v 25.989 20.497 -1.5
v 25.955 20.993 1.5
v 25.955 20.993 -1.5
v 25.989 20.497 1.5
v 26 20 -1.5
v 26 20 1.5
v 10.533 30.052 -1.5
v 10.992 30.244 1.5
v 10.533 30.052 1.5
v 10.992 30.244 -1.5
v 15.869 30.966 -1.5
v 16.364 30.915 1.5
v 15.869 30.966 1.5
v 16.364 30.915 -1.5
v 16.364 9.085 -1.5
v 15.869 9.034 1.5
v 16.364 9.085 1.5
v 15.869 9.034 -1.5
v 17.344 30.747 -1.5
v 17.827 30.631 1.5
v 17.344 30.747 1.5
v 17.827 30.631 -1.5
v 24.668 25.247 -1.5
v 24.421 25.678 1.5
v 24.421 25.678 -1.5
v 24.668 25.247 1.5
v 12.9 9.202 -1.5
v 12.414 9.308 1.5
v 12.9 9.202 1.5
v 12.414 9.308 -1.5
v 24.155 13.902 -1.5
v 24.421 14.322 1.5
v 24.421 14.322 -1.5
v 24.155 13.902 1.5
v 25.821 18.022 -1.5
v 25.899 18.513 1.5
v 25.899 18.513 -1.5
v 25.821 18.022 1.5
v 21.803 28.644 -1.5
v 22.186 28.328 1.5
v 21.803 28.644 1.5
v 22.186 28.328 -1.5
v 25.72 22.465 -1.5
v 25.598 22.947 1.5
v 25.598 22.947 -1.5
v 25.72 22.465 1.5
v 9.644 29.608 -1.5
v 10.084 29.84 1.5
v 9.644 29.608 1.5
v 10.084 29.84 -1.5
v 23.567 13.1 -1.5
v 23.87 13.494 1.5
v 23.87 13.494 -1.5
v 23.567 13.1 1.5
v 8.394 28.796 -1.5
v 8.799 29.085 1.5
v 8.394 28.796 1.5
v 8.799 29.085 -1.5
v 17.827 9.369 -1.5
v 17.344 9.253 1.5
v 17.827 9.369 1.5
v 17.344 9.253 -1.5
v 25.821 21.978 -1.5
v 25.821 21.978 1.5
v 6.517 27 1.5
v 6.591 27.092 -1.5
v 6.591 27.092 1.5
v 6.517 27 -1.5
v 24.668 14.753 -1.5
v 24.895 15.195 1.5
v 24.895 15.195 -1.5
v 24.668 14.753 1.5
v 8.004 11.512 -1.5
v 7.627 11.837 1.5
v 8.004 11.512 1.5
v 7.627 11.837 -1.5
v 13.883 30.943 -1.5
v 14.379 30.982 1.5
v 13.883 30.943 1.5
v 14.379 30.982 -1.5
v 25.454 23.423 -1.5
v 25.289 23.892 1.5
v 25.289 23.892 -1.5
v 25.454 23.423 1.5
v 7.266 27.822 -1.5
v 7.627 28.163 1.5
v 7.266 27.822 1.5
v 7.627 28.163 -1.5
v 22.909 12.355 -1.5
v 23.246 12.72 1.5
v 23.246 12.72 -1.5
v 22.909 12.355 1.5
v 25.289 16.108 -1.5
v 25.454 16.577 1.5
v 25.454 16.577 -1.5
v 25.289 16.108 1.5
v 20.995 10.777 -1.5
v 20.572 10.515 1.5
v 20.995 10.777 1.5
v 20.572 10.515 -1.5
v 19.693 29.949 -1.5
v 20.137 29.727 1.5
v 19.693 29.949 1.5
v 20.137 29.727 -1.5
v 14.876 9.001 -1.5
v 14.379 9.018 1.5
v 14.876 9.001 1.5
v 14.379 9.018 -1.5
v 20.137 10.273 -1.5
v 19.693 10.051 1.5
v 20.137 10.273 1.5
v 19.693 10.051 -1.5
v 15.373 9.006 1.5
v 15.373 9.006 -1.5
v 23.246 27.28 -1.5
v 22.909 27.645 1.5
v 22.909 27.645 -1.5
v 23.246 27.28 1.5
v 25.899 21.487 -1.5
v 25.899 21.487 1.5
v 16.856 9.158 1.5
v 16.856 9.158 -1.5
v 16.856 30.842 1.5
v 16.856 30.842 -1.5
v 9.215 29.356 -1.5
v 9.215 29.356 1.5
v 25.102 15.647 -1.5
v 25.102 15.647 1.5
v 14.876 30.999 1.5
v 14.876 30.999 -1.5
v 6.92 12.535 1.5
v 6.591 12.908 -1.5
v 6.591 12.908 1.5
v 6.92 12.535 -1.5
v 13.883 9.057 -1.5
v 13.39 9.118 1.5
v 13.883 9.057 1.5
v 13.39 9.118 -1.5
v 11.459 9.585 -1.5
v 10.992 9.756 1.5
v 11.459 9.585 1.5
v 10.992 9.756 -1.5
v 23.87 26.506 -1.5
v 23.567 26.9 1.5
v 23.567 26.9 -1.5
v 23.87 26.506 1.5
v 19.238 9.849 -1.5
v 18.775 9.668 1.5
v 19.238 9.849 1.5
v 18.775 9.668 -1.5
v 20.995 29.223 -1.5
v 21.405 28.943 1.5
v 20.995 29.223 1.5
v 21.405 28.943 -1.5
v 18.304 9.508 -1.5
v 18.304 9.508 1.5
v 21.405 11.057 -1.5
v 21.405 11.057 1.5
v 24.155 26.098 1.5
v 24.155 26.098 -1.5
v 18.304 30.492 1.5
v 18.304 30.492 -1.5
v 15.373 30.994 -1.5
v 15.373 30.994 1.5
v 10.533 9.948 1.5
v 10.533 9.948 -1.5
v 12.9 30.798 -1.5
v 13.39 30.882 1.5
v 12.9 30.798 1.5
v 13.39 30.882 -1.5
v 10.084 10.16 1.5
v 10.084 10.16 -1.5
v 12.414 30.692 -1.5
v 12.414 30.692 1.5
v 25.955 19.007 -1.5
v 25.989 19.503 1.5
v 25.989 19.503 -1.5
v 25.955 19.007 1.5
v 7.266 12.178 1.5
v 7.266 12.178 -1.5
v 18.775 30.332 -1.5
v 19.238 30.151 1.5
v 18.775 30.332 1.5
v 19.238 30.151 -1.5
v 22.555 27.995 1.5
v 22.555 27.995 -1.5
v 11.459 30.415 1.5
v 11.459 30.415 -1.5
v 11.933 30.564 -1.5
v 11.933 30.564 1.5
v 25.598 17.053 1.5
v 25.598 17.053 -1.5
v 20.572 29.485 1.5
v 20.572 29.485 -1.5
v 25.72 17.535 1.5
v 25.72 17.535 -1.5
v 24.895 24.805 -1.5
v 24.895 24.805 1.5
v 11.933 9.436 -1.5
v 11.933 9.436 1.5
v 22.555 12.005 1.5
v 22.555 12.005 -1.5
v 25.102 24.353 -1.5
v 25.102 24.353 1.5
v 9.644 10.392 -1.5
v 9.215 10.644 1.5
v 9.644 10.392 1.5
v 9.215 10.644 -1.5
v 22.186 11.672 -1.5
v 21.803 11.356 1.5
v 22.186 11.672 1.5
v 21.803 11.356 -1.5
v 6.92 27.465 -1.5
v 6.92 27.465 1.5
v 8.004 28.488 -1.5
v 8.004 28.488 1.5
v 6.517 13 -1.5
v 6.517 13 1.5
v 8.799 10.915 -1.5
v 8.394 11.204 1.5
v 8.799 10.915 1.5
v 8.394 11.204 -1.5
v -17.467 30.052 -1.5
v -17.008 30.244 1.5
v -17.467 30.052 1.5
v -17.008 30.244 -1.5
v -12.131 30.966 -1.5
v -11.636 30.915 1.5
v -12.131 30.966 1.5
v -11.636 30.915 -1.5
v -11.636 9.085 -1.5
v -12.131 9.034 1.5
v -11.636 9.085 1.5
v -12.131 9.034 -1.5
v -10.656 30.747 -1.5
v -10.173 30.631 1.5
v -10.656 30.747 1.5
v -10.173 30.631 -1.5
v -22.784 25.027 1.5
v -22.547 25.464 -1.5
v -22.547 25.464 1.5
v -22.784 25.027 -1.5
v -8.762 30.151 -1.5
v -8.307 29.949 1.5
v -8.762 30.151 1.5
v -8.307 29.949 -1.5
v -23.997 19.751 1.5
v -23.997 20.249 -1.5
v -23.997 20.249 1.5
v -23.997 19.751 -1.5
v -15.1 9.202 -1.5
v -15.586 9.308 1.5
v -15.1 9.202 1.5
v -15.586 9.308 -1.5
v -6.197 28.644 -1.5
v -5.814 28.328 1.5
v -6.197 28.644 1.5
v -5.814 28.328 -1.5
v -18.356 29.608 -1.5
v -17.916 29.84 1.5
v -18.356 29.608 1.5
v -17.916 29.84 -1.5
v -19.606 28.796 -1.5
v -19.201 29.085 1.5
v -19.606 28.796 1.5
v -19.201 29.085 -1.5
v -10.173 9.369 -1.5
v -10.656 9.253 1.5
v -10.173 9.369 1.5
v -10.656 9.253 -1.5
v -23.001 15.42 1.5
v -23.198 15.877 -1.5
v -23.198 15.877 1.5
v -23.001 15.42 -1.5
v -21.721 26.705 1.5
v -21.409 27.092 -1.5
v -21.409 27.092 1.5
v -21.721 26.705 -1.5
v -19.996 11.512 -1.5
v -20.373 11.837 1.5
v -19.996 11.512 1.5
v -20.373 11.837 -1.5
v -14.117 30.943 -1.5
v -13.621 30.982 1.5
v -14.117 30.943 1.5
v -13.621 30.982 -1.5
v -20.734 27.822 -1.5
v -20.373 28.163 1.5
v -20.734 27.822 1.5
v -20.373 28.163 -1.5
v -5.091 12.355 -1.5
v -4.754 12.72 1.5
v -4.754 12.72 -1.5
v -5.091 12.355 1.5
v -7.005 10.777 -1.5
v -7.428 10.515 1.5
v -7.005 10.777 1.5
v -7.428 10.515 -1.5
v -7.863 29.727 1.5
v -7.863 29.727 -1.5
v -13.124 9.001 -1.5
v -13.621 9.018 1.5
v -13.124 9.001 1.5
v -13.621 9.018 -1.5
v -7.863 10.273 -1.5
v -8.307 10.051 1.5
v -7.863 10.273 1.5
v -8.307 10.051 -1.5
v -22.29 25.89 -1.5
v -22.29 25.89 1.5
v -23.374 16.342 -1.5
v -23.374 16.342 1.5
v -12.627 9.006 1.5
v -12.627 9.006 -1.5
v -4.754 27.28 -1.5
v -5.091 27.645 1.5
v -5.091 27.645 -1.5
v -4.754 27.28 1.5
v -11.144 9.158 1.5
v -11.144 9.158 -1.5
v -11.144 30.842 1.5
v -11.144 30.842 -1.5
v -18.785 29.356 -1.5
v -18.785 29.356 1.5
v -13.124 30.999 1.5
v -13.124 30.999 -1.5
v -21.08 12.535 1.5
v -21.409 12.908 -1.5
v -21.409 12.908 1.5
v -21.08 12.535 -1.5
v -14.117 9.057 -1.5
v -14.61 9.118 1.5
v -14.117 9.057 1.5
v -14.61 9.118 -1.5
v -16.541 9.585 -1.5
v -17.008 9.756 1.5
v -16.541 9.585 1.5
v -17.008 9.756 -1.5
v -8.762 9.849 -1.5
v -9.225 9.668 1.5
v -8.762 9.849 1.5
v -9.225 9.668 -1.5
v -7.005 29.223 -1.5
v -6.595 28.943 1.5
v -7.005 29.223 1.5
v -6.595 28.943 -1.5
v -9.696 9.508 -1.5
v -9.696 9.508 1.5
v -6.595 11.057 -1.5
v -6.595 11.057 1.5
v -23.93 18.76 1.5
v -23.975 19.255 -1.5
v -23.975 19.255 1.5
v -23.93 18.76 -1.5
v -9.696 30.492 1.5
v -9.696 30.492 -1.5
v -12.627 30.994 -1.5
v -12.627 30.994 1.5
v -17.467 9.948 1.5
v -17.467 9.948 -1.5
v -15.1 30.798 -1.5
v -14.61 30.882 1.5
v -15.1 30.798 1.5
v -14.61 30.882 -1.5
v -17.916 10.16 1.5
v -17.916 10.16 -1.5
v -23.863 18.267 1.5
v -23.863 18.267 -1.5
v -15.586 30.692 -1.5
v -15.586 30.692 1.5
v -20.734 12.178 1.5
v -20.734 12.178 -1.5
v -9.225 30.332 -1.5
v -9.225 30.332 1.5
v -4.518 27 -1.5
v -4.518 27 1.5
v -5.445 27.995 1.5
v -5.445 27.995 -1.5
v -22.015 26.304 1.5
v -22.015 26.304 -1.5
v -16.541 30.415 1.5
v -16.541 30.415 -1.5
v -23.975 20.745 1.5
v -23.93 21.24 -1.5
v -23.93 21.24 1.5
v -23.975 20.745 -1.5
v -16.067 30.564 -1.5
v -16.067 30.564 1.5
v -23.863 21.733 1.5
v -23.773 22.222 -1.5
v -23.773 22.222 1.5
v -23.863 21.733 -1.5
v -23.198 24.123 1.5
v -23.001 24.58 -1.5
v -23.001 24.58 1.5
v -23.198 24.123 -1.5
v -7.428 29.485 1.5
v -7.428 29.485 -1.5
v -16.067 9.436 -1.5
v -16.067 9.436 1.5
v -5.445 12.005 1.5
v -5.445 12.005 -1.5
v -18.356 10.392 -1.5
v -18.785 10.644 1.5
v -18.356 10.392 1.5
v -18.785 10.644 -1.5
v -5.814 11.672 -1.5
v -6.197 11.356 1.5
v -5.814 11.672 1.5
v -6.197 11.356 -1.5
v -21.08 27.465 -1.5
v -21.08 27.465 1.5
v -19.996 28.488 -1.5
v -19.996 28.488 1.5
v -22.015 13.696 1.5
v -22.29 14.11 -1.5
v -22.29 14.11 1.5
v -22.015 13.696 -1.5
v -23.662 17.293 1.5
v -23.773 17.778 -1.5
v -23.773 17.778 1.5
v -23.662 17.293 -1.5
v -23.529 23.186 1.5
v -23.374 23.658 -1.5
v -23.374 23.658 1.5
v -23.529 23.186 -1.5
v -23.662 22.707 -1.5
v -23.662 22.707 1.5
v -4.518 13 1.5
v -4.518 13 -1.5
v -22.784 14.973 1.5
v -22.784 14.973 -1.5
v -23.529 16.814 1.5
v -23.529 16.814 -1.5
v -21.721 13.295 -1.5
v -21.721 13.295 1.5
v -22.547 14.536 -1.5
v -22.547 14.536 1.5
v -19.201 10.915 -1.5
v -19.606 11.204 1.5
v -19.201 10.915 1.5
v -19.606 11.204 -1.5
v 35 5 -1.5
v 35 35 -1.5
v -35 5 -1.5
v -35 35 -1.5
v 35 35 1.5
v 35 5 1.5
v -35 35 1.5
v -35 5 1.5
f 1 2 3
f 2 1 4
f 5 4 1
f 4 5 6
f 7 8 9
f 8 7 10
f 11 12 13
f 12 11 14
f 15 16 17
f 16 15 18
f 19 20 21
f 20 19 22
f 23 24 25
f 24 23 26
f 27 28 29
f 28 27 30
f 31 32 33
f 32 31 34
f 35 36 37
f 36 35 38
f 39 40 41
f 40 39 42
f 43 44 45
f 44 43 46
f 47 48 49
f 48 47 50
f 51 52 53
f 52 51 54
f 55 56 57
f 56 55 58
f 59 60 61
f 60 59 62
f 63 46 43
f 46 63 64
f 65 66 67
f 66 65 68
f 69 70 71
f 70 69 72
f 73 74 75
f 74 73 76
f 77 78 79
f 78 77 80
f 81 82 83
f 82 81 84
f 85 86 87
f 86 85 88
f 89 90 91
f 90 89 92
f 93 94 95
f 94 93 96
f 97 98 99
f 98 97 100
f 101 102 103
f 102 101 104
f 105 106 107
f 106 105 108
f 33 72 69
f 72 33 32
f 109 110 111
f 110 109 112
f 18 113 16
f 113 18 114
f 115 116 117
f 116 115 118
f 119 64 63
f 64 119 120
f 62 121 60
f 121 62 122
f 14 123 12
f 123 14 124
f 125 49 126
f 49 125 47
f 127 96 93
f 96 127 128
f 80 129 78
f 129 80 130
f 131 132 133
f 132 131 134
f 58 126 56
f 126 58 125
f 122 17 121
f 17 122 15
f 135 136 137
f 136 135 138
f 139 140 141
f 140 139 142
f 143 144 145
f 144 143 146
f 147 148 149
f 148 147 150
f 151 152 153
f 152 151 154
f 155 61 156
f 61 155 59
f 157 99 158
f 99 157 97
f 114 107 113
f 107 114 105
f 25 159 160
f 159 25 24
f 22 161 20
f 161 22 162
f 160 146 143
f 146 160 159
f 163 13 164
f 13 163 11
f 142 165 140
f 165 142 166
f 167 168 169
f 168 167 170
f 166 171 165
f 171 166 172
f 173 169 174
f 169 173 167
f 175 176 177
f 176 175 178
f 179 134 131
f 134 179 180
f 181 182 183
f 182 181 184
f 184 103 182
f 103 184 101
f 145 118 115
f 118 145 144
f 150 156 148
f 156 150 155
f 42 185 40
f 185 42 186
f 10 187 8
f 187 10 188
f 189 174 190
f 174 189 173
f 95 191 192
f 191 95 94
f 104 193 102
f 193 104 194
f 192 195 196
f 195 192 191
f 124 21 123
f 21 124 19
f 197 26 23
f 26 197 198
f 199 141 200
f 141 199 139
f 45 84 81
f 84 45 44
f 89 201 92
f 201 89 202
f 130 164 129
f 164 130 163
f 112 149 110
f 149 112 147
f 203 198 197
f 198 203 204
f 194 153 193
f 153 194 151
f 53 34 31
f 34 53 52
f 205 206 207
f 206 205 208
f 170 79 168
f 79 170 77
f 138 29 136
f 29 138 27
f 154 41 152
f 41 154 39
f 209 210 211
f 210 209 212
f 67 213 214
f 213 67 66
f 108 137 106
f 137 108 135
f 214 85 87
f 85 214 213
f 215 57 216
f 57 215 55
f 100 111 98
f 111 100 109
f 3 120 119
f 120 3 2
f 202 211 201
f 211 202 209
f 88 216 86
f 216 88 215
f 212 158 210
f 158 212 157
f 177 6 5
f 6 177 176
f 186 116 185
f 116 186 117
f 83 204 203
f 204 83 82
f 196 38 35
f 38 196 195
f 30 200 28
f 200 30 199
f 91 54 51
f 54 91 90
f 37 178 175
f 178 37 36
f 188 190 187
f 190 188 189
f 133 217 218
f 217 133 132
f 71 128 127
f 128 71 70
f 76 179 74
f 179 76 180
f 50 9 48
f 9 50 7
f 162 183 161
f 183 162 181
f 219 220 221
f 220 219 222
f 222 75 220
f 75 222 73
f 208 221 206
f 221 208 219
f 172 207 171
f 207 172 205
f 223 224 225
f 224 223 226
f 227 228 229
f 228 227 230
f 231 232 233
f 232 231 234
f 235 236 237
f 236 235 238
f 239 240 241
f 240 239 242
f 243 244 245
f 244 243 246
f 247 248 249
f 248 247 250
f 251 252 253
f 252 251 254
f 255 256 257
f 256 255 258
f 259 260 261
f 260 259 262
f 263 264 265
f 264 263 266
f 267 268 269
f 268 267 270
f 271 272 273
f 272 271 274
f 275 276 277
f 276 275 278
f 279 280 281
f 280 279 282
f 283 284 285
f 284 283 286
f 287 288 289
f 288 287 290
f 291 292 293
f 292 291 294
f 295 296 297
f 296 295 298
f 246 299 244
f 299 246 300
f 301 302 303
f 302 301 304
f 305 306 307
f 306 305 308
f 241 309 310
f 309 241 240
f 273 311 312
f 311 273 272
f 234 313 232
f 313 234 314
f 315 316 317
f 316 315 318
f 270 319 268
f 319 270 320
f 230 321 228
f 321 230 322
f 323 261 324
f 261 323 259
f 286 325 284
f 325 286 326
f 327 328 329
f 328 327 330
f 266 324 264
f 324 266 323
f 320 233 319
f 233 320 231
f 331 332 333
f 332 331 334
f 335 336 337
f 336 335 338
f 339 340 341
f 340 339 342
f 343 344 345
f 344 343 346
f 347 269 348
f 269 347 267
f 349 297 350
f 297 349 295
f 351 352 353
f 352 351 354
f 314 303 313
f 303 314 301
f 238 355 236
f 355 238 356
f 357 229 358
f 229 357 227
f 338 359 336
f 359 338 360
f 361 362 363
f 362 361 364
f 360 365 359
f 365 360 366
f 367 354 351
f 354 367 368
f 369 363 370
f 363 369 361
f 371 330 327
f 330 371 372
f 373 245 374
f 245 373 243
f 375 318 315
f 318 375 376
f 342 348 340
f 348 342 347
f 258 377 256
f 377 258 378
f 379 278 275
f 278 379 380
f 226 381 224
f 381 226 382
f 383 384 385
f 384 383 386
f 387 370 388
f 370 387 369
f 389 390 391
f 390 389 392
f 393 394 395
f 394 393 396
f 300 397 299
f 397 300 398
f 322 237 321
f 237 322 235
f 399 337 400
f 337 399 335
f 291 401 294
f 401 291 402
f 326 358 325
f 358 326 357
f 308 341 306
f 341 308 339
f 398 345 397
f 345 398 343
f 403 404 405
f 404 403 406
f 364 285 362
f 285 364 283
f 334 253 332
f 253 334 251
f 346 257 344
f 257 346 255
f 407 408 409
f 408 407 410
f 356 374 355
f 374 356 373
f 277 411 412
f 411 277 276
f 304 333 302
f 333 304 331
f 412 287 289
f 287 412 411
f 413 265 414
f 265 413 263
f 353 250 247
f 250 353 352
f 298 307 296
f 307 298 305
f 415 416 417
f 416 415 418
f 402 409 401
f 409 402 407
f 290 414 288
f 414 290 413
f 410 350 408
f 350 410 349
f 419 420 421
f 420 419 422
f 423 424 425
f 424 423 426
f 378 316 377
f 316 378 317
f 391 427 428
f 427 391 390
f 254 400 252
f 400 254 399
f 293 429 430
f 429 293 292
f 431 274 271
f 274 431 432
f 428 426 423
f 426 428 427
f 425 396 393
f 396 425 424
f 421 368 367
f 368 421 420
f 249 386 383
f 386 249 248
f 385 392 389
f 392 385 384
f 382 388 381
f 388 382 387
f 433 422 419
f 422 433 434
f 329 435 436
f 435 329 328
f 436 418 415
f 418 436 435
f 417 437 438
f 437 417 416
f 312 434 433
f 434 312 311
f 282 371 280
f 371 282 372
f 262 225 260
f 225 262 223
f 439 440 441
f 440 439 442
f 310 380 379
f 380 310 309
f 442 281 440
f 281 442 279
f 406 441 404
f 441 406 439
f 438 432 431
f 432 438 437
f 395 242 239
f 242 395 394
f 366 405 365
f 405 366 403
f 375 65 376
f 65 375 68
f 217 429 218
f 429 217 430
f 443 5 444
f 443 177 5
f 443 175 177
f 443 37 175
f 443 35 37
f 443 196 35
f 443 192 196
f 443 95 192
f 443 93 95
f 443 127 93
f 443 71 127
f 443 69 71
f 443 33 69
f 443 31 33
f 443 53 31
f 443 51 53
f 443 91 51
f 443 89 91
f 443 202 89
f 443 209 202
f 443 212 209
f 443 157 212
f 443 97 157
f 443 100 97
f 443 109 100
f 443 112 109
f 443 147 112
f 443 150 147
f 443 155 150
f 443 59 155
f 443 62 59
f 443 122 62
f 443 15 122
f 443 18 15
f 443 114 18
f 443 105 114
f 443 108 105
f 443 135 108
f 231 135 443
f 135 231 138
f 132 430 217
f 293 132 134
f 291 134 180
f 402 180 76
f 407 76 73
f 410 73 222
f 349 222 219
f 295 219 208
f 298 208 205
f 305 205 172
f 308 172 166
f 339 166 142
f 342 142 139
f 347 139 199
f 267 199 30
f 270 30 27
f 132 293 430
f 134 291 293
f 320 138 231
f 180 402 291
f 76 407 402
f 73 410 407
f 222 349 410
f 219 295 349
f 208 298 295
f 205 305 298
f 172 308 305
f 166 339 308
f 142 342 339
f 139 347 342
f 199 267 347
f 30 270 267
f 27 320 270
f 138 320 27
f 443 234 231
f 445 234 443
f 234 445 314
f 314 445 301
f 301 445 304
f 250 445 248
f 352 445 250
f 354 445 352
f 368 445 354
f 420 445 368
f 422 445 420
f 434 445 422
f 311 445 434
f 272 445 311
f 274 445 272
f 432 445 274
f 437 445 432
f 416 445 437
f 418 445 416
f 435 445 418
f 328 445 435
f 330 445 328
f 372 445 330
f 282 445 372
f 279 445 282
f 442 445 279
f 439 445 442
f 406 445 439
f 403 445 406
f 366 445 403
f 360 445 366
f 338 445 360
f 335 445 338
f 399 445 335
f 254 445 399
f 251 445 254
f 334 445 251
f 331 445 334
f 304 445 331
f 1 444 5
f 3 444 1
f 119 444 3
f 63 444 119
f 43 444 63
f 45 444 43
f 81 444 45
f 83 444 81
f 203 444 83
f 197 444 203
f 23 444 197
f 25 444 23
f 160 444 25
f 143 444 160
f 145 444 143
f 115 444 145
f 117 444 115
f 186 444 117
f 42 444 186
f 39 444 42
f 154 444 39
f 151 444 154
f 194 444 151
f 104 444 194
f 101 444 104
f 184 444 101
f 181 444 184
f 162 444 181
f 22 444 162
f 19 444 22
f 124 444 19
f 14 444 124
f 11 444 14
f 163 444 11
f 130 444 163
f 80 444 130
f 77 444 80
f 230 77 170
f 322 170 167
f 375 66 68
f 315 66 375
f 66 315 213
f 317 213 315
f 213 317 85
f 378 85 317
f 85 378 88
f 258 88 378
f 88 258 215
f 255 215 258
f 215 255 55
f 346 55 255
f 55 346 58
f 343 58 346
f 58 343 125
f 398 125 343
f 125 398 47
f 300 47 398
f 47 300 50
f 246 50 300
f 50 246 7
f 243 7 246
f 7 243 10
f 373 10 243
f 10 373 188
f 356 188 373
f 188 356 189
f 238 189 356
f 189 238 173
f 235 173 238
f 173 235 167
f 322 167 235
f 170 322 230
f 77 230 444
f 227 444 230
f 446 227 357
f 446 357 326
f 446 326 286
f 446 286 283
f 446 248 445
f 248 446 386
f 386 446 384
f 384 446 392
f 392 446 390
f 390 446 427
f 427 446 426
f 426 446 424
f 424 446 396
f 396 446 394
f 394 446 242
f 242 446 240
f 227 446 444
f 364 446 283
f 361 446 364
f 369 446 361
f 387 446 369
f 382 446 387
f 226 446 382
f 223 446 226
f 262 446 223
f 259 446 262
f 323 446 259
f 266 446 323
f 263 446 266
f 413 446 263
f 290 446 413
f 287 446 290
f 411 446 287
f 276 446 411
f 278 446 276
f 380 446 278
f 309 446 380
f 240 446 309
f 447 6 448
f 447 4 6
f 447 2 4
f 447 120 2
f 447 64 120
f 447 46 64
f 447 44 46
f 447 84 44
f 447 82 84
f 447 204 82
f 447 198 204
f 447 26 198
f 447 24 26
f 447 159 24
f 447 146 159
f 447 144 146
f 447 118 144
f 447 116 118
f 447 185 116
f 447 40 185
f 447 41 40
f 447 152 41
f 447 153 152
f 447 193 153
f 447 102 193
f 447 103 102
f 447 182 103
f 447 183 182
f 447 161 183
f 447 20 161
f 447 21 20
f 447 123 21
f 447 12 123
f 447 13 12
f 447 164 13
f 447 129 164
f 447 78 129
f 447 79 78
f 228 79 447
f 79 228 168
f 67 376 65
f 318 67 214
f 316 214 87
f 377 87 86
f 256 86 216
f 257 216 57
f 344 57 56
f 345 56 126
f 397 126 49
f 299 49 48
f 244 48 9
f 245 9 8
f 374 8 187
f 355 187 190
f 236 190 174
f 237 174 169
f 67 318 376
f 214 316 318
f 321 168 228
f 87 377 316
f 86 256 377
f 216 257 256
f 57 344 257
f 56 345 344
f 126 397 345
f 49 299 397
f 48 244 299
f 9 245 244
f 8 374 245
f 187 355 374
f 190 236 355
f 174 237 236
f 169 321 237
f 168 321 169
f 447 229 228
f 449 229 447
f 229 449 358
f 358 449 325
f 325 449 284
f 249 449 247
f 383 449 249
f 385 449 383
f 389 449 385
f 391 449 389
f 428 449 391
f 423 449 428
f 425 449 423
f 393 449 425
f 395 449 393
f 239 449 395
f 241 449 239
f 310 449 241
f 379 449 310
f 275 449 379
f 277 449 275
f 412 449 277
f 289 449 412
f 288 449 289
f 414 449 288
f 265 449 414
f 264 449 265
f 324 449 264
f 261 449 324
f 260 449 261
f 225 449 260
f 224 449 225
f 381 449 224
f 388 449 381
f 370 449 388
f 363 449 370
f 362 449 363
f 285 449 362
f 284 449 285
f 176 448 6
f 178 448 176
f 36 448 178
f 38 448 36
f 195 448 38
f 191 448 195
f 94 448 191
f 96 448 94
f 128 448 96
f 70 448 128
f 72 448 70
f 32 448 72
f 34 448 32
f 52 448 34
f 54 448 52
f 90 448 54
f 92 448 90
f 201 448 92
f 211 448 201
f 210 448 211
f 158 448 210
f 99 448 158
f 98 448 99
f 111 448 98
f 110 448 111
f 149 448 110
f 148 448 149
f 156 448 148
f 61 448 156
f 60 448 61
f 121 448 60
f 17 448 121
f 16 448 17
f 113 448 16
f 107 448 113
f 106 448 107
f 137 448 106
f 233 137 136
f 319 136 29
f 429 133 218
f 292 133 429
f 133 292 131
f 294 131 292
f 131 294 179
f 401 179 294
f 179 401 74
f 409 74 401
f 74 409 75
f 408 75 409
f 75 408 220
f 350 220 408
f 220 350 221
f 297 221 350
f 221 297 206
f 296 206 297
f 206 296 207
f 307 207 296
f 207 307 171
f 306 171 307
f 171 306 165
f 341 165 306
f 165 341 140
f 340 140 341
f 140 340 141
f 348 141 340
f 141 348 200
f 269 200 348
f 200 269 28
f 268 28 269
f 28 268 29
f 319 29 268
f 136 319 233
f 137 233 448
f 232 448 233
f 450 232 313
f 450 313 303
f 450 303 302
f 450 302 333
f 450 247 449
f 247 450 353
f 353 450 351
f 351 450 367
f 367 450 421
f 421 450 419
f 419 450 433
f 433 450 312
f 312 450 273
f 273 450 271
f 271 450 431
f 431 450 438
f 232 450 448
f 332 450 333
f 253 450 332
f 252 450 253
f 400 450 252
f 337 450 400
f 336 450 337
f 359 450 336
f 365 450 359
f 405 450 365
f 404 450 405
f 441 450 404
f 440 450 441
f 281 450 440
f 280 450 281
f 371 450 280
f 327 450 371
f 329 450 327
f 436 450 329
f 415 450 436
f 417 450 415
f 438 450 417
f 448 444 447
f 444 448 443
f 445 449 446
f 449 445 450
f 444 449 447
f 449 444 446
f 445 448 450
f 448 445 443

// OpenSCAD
// file: _kittycam-lib.scad
$fa=0.5;
$fs=0.5;


// 38mm spacers

module corner(radius=4, height=3) {
    cylinder(r=radius, h=height, center=true);
}

module baseCorners(width=32.5, height=32.5, padding=0, z=0) {
    for (x=[width+padding, -width-padding]) { 
        for (y=[height+padding, -height-padding]) { 
            translate([x, y, z])
            corner(radius=2.75, height=10);
        }
    }
}

module spacer(radius=2.75, thickness=1.25, height=38) {
    difference() {
        cylinder(r=radius+thickness, height, center=true);
        cylinder(r=radius, 110, center=true);
    }
}

module kittycam (render_spacer=false,
                    spacer_height=38,
                    render_bottom_plate=true,
                    render_middle_plate=true,
                    render_top_plate=true) {
                        
    if (render_spacer) {
        spacer(height=spacer_height);
    } else {
        
        difference() {
        
            // RPi footprint = 100mm = 3.93 inches
            RPiSize = 100;
            wallThickness = 3;
            hullCornerRadius = 4;
            size = (RPiSize / 2) - hullCornerRadius; // subtract the hull corner radius
            hull() {
                for (x=[size, -size]) { 
                    for (y=[size, -size]) { 
                        translate([x, y, 0])
                            cylinder(r=4, h=wallThickness, center=true);
                    }
                }
            }
        
            if (render_bottom_plate) {
                
                // RPi mounting holes
                translate([-12, 0, 0]) 
                    for (x=[29.25, -29.25]) 
                        for (y=[24.75, -24.75])
                            translate([x, y, 0]) 
                                cylinder(r=1.825, h=10, center=true);
            }
            
            if (render_middle_plate) {
                    
                // lidar
                translate([0, 20, 0])   // was 20, 20, 0
                    for (x=[15, -15])
                        for (y=[10 + 4, -10 - 4])
                            translate([x, y, 0])
                                cylinder(r=2, h=10, center=true);
                // lidar slot        
                translate([0, 44, 0])     
                     cube([20, 2, 20], center=true);   
                        
                // protoboard 45.5mm x 25.4mm
                translate([0, -20, 0])
                    for (x=[22.75, -22.75])
                        for (y=[12.7, -12.7])
                            translate([x, y, 0])
                                cylinder(r=1.75, h=10, center=true);
                
                // camera slot        
                cube([20, 2, 20], center=true);
            }
            
            
            if (render_top_plate) {
                
                // camera mounts
                translate([0, -6, 0]) // was -30, 18, 0
                    for (x=[10.5, -10.5]) 
                        for (y=[6, -6])
                            translate([x, y, 0])
                                cylinder(r=1.5, h=10, center=true);
          
                // camera lens
                color([1, 0, 0])
                    translate([0, 0, 0])
                        cube(9, true);
        
                // lidar hole
                translate([0, 20, 0])   // was 20, 20, 0
                        cube([24, 14, 12], center=true);
                
                translate([0, 20, 0]) 
                    for (x=[15, -13])    
                        translate([x, 0, 0])
                            cylinder(r=11, h=10, center=true);   
   
   
                // LEDs
                translate([10.5, -42, 0])
                    cylinder(r=1.75, h=10, center=true);
        
                translate([-10.5, -42, 0])
                    cylinder(r=1.75, h=10, center=true);
        
            }
         
            // corners
            cornerRadius = 2.85; // M5 hex nut has a 5mm wide bolt
            c = RPiSize / 2 - cornerRadius * 2;
            for (x=[c, -c])
                for (y=[c, -c])
                    translate([x, y, 0])
                        cylinder(r=cornerRadius, h=10, center=true);
                
                
            translate([60, 0, 0])
                cube([50, 100, 10], center=true);
                
            translate([-60, 0, 0])
                cube([50, 100, 10], center=true);
                
            translate([0, 60, 0])
                cube([100, 50, 10], center=true);
                
            translate([0, -25, 0])
                cube([100, 60, 10], center=true);
                
        }
    }
}

kittycam(render_spacer=false,
            spacer_height=38,
            render_bottom_plate=false,
            render_middle_plate=false,
            render_top_plate=true);


    
    
    
// main file
include <_kittycam-lib.scad>

/* Example 01.
 * Standard RPi enclosure.
 *
 *          render_spacer = false; // if true, only renders spacer
 *          spacer_height = 38; // spacer height
 *          render_bottom_plate = true; // RPi mounts
 *          edgePadding = 12; // distance bw base edge and RPi edge
 *          standoffHeight = 4; // hright of RPi standoffs
 *          printRPi = false; // set to true to print the RPi footprint
 *          spcRPiH = 26; // spacer height from base to bottom speaker panel
 *          spcSpeakerH = 18; // spacer height bw top and bottom speaker panels
 *          spcGrillH = 6; // spacer height bw top speaker panel and grill
 *          printGrill = false; // set to true to print grill
 *          totalRings = 16; // total grill pattern rings
 *          maxGrillHoleRadius = 2.25;
 */
 kittycam(render_spacer=false,
            spacer_height=38,
            render_bottom_plate=false,
            render_middle_plate=true,
            render_top_plate=true);
